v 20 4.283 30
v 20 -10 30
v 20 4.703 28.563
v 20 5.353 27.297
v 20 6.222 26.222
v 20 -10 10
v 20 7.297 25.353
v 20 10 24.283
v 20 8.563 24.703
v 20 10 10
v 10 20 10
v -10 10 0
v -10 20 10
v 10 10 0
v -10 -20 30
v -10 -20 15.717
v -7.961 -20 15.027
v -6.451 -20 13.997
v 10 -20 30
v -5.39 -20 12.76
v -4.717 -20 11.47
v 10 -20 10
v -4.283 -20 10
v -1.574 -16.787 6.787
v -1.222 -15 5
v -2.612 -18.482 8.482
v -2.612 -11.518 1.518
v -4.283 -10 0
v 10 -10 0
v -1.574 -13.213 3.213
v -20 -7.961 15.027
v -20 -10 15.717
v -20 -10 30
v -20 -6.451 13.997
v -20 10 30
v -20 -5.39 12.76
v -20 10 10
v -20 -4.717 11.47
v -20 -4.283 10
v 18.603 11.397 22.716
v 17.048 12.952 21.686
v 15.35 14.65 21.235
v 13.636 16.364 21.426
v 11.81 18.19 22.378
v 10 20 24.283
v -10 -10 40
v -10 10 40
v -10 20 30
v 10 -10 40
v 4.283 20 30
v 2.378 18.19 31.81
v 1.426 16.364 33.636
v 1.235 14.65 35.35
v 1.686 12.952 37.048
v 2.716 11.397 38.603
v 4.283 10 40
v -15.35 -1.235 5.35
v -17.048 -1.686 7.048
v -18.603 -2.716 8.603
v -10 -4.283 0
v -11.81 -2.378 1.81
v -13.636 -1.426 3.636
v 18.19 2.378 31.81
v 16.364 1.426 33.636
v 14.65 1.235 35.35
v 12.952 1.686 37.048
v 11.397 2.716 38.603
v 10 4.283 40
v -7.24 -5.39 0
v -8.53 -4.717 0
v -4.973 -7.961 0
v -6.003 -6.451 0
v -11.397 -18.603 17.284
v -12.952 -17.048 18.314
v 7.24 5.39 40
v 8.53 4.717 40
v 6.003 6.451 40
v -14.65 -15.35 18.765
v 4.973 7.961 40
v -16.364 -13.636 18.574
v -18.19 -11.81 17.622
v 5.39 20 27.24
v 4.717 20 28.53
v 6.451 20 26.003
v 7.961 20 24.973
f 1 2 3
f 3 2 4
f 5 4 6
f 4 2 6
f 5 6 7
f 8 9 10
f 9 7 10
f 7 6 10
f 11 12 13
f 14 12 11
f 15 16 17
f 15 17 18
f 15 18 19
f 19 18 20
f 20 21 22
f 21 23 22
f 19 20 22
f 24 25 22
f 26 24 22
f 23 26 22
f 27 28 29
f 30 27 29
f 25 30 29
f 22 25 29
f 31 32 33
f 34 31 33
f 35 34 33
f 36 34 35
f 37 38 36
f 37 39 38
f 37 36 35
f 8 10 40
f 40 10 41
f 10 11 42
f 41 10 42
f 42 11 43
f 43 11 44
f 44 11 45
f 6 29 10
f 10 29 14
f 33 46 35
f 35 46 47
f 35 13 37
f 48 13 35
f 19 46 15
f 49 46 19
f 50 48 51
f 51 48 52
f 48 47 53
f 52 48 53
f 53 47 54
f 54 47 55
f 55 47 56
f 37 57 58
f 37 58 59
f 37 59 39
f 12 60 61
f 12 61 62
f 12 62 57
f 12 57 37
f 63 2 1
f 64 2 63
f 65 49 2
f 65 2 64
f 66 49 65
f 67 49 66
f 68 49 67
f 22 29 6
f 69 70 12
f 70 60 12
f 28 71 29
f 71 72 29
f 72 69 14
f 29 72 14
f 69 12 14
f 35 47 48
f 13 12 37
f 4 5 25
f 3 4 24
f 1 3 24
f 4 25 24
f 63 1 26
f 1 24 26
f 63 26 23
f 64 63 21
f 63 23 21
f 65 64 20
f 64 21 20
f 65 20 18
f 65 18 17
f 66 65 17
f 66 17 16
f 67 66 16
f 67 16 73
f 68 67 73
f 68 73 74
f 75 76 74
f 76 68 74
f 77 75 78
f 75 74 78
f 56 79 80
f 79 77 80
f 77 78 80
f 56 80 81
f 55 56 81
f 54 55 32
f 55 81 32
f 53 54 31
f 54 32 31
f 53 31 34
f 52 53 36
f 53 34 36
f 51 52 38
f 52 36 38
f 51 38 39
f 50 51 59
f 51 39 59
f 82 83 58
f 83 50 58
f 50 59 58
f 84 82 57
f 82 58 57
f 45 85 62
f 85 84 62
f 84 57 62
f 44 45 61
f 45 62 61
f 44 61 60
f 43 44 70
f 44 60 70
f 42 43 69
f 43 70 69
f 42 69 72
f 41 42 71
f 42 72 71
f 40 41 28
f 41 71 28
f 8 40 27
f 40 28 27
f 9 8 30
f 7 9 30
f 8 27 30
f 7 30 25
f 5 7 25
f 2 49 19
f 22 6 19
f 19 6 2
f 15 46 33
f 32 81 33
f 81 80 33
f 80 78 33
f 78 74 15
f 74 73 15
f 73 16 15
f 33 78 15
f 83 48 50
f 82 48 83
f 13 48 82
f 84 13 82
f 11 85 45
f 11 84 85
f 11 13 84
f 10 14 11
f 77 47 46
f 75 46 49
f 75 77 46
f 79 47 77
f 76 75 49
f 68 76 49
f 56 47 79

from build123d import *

# Parameters (mm, degrees)
F0_W     = 40
F0_H     = 40
F1_DEPTH = 40
F2_SIZE  = 10
F4_D     = 22.5


with BuildPart() as f1:
    # F0 (on Top) → F1 (new body)
    with BuildSketch(Plane.XY):
        Rectangle(F0_W, F0_H)
    extrude(amount=F1_DEPTH)

    # F2
    f2_edges = [f1.edges().sort_by_distance(p)[0] for p in [
        (0, -20, 40),
        (20, 0, 40),
        (0, 20, 40),
        (-20, 0, 40),
        (0, -20, 0),
        (20, 0, 0),
        (0, 20, 0),
        (-20, 0, 0),
        (20, -20, 20),
        (-20, -20, 20),
        (20, 20, 20),
        (-20, 20, 20),
    ]]
    chamfer(f2_edges, length=F2_SIZE)

    # F4 (through all)
    with Locations(Plane(origin=(20, 20, 20), x_dir=(-0.816497, 0.408248, 0.408248), z_dir=(0.57735, 0.57735, 0.57735))):
        with Locations((8.164966, 14.142136)):
            Hole(F4_D / 2)


solid = f1.part
